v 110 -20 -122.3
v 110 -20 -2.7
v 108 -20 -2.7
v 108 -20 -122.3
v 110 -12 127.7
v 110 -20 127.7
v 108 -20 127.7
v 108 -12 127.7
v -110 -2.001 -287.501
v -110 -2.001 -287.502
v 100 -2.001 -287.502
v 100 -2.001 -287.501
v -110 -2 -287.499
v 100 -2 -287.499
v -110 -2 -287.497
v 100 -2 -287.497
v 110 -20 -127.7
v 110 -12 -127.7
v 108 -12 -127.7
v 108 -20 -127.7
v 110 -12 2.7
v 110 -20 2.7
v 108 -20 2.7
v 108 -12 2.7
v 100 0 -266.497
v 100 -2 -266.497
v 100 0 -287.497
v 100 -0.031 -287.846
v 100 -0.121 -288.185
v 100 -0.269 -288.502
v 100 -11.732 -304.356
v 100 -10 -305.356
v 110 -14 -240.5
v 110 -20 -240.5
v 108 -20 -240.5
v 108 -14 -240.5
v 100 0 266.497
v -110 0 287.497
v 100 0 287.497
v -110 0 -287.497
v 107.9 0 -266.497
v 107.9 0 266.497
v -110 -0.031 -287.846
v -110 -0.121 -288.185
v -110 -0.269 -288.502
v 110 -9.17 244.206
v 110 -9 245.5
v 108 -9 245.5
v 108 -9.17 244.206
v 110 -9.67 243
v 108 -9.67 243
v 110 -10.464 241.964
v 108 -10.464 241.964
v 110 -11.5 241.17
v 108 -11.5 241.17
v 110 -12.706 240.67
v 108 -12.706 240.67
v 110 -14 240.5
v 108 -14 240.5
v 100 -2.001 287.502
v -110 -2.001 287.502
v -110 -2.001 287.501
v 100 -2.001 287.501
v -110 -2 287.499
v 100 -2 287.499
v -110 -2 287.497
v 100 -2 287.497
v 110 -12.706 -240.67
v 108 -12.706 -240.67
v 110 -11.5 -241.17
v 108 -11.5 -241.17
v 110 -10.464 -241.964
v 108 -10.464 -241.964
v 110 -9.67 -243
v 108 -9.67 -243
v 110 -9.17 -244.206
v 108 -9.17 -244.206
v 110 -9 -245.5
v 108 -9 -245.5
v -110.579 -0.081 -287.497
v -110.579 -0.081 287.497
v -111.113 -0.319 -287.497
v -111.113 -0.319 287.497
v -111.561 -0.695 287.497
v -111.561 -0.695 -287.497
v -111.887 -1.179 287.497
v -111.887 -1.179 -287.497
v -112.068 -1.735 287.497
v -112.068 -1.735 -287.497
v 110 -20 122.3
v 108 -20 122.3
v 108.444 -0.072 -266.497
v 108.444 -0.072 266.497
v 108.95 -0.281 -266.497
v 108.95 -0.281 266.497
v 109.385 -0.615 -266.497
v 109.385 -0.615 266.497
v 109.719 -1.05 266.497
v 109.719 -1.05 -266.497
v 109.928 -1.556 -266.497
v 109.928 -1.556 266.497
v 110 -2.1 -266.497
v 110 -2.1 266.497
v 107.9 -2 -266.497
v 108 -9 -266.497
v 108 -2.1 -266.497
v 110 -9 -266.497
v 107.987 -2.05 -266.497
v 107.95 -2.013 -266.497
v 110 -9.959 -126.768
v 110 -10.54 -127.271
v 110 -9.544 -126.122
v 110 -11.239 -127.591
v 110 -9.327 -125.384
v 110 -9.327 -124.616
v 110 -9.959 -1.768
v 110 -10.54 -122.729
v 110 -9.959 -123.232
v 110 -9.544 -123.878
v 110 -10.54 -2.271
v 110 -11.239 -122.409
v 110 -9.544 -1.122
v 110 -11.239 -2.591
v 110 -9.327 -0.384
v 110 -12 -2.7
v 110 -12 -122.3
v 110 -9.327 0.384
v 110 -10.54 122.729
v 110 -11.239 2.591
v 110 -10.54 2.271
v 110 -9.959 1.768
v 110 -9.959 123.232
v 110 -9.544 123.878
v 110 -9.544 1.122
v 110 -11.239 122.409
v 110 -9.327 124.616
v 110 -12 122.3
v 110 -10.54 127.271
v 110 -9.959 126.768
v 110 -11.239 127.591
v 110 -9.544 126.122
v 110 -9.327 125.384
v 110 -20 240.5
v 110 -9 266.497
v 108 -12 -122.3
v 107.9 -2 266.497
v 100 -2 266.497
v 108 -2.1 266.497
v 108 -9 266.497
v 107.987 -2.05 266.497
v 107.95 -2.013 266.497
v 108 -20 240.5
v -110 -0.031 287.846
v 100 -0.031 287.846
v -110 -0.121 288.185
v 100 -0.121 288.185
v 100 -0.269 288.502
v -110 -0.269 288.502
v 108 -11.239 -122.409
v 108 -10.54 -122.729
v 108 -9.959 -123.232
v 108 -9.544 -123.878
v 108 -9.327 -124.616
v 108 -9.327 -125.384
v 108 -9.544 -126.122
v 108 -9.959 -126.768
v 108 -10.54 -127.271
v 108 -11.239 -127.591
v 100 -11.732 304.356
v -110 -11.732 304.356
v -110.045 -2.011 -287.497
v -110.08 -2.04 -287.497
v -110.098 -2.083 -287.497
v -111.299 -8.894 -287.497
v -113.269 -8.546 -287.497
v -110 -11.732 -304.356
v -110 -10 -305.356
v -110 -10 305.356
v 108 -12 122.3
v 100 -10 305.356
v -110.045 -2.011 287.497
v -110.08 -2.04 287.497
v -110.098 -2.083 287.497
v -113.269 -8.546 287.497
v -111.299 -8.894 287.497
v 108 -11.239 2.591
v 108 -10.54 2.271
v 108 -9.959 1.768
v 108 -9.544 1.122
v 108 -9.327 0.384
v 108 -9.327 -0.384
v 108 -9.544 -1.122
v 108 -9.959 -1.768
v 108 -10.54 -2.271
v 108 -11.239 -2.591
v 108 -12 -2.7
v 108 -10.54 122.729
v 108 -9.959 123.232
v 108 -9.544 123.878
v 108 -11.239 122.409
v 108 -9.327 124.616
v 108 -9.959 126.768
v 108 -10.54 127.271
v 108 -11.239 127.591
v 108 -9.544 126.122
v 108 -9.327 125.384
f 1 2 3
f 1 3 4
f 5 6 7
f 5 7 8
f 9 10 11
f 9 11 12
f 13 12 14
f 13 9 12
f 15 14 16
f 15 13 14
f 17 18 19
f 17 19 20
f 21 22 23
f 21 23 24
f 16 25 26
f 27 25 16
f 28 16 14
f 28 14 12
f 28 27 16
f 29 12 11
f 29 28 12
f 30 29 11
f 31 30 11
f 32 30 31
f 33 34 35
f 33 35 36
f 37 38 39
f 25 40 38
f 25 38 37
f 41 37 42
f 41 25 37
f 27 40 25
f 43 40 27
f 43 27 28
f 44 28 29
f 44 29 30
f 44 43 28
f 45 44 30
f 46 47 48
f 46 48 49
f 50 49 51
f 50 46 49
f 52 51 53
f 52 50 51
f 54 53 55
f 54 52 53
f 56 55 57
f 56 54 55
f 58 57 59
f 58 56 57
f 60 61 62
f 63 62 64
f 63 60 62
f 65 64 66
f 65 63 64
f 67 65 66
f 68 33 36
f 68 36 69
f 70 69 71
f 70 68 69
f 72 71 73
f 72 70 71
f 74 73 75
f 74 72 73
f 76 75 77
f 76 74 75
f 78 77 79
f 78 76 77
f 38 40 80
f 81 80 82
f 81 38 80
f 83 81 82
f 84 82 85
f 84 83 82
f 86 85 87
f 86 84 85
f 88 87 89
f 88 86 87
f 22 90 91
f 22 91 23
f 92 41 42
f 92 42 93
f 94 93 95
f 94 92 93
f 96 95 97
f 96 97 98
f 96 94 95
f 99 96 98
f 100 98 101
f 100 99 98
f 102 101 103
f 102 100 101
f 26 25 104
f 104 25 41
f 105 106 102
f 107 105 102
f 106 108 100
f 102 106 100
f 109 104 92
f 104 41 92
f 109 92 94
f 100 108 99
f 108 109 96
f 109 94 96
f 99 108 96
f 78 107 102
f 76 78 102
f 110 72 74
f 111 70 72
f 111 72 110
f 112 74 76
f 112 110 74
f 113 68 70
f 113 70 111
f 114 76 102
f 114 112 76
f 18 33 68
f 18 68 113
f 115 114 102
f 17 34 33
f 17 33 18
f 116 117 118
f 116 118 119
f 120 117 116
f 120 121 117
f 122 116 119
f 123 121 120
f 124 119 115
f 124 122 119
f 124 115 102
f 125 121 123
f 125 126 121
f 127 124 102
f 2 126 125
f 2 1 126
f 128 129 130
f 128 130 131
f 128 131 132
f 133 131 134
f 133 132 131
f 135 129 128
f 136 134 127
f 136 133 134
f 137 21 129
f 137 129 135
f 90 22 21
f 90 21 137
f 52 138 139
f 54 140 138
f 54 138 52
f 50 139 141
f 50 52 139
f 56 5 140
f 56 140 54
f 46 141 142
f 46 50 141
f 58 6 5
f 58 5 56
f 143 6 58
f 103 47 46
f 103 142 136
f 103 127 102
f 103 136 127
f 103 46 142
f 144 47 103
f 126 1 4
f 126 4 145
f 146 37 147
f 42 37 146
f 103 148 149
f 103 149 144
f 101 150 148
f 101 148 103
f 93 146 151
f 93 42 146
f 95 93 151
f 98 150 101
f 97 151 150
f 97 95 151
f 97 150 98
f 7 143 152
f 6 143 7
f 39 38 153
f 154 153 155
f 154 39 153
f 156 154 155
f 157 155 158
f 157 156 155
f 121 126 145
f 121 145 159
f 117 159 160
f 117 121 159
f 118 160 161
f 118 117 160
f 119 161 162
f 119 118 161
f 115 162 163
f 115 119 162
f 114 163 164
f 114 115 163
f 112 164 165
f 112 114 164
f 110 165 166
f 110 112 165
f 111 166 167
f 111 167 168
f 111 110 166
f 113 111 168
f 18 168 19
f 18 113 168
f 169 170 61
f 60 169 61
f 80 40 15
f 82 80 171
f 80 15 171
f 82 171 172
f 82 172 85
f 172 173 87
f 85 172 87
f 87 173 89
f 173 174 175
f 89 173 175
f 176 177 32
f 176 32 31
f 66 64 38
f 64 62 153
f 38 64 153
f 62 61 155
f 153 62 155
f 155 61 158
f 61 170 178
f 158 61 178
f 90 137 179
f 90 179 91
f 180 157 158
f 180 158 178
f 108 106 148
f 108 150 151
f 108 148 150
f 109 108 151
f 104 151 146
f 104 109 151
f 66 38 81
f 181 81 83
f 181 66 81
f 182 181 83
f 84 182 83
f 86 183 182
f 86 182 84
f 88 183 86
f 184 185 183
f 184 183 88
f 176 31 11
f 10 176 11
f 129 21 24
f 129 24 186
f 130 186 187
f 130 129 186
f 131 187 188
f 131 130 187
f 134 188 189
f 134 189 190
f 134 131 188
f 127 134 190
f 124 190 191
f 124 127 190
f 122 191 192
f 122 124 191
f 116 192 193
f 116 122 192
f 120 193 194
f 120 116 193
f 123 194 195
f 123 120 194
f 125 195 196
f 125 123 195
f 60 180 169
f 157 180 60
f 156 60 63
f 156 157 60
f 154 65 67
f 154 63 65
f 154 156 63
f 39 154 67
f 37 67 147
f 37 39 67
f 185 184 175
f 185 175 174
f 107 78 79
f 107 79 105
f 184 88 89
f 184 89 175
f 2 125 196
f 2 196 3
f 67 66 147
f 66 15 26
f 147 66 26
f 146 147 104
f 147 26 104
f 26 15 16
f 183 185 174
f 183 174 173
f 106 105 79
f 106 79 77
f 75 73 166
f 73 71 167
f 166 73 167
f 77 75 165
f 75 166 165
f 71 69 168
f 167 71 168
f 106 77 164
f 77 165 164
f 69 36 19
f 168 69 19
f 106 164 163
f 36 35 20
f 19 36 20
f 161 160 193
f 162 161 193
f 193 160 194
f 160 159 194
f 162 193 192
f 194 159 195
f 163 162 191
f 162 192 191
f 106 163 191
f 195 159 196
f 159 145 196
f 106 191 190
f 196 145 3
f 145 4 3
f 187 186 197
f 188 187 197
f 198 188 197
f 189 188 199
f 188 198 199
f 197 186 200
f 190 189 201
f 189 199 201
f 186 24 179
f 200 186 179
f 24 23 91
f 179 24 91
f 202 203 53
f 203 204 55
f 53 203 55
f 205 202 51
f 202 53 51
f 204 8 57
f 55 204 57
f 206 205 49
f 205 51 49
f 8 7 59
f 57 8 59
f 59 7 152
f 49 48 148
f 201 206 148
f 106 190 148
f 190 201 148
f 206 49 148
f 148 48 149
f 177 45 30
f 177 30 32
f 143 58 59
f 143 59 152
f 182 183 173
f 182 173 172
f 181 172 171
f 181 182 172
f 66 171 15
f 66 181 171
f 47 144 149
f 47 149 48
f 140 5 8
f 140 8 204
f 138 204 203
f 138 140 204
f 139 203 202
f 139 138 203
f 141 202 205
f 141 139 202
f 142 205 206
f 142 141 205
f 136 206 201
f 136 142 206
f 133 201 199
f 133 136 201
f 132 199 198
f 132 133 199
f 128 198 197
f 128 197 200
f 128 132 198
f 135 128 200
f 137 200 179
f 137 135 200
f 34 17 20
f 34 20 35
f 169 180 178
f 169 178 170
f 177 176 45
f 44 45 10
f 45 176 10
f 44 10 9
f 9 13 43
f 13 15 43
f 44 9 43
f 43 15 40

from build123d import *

# Parameters (mm, degrees)
SKIZZE9_W                       = 220
SKIZZE9_H                       = 575
BASIS_BLECH2_DEPTH              = 2
KANTE_LASCHE3_STRIP_W           = 8.2
KANTE_LASCHE3_STRIP_H           = 2
KANTE_LASCHE3_STRIP_CUT_DEPTH   = 575
KANTE_LASCHE3_DEPTH             = 575
KANTE_LASCHE3_FLAT_DEPTH        = 2
KANTE_LASCHE4_STRIP_CUT_DEPTH   = 217.9
KANTE_LASCHE4_STRIP_CUT_2_DEPTH = 217.9
KANTE_LASCHE4_DEPTH             = 217.9
KANTE_LASCHE4_BEND_DEPTH        = 217.9
SKIZZE43_W                      = 10
SKIZZE43_H                      = 42
SCHNITT_LINEAR_AUSTRAGEN4_DEPTH = 326.18077275
KANTE_LASCHE5_DEPTH             = 574.994641016


# Sheet-metal steps are written as plain solids
with BuildPart() as part:
    # Skizze9 → Basis-Blech2 (new body)
    with BuildSketch(Plane(origin=(0, 0, 0), x_dir=(1, 0, 0), z_dir=(0, 1, 0))):
        Rectangle(SKIZZE9_W, SKIZZE9_H)
    extrude(amount=-BASIS_BLECH2_DEPTH)

    # Kante-Lasche3 strip (across the edge) → Kante-Lasche3 strip cut (cut)
    with BuildSketch(Plane(origin=(110, -2, -287.5), x_dir=(-1, 0, 0), z_dir=(0, 0, 1))):
        with Locations((-2, -1)):
            Rectangle(KANTE_LASCHE3_STRIP_W, KANTE_LASCHE3_STRIP_H)
    extrude(amount=KANTE_LASCHE3_STRIP_CUT_DEPTH, mode=Mode.SUBTRACT)

    # Kante-Lasche3 bend section (across the edge) → Kante-Lasche3 (add)
    with BuildSketch(Plane(origin=(110, -2, -287.5), x_dir=(-1, 0, 0), z_dir=(0, 0, 1))):
        with BuildLine():
            Line((0, 0.1), (2, 0.1))
            ThreePointArc((2, 0.1), (2.029289322, 0.029289322), (2.1, 0))
            Line((2.1, 0), (2.1, -2))
            ThreePointArc((2.1, -2), (0.61507576, -1.38492424), (0, 0.1))
        make_face()
    extrude(amount=KANTE_LASCHE3_DEPTH)

    # Kante-Lasche3 profile (on flange) → Kante-Lasche3 flat (add)
    with BuildSketch(Plane(origin=(110, -2, 0), x_dir=(0, 0, 1), z_dir=(1, 0, 0))):
        with BuildLine():
            Line((287.5, 0.1), (287.5, 7))
            Line((287.5, 7), (245.5, 7))
            ThreePointArc((245.5, 7), (241.964466094, 8.464466094), (240.5, 12))
            Line((240.5, 12), (240.5, 18))
            Line((240.5, 18), (127.7, 18))
            Line((127.7, 18), (127.7, 10))
            ThreePointArc((127.7, 10), (125, 7.3), (122.3, 10))
            Line((122.3, 10), (122.3, 18))
            Line((122.3, 18), (2.7, 18))
            Line((2.7, 18), (2.7, 10))
            ThreePointArc((2.7, 10), (0, 7.3), (-2.7, 10))
            Line((-2.7, 10), (-2.7, 18))
            Line((-2.7, 18), (-122.3, 18))
            Line((-122.3, 18), (-122.3, 10))
            ThreePointArc((-122.3, 10), (-125, 7.3), (-127.7, 10))
            Line((-127.7, 10), (-127.7, 18))
            Line((-127.7, 18), (-240.5, 18))
            Line((-240.5, 18), (-240.5, 12))
            ThreePointArc((-240.5, 12), (-241.964466094, 8.464466094), (-245.5, 7))
            Line((-245.5, 7), (-287.5, 7))
            Line((-287.5, 7), (-287.5, 0.1))
            Line((-287.5, 0.1), (287.5, 0.1))
        make_face()
    extrude(amount=-KANTE_LASCHE3_FLAT_DEPTH)

    # Kante-Lasche4 strip (across the edge) → Kante-Lasche4 strip cut (cut)
    with BuildSketch(Plane(origin=(-110, -2, -287.5), x_dir=(0, -0.8660254037844416, 0.49999999999999495), z_dir=(1, 0, 0))):
        Polygon((-5.740711062, 5.94320323), (-1.730711062, -1.002320508), (0.001339746, -0.002320508), (-4.008660254, 6.94320323), align=None)
    extrude(amount=KANTE_LASCHE4_STRIP_CUT_DEPTH, mode=Mode.SUBTRACT)

    # Kante-Lasche4 strip 2 (across the edge) → Kante-Lasche4 strip cut 2 (cut)
    with BuildSketch(Plane(origin=(107.9, -2, 287.5), x_dir=(0, -0.8660254037844416, -0.49999999999999495), z_dir=(-1, 0, 0))):
        Polygon((-5.740711062, 5.94320323), (-1.730711062, -1.002320508), (0.001339746, -0.002320508), (-4.008660254, 6.94320323), align=None)
    extrude(amount=KANTE_LASCHE4_STRIP_CUT_2_DEPTH, mode=Mode.SUBTRACT)

    # Kante-Lasche4 section (across the edge) → Kante-Lasche4 (add)
    with BuildSketch(Plane(origin=(-110, -2, -287.5), x_dir=(0, -0.8660254037844416, 0.49999999999999495), z_dir=(1, 0, 0))):
        with BuildLine():
            Line((-2, 0.002679492), (-2, 19.464101615))
            Line((-2, 19.464101615), (0, 19.464101615))
            Line((0, 19.464101615), (0, 0.002679492))
            ThreePointArc((0, 0.002679492), (0.000340742, 9.1301e-05), (0.001339746, -0.002320508))
            Line((0.001339746, -0.002320508), (-1.730711062, -1.002320508))
            ThreePointArc((-1.730711062, -1.002320508), (-1.931510911, -0.517546789), (-2, 0.002679492))
        make_face()
    extrude(amount=KANTE_LASCHE4_DEPTH)

    # Kante-Lasche4 section 2 (across the edge) → Kante-Lasche4 bend (add)
    with BuildSketch(Plane(origin=(107.9, -2, 287.5), x_dir=(0, -0.8660254037844416, -0.49999999999999495), z_dir=(-1, 0, 0))):
        with BuildLine():
            Line((-2, 0.002679492), (-2, 19.464101615))
            Line((-2, 19.464101615), (0, 19.464101615))
            Line((0, 19.464101615), (0, 0.002679492))
            ThreePointArc((0, 0.002679492), (0.000340742, 9.1301e-05), (0.001339746, -0.002320508))
            Line((0.001339746, -0.002320508), (-1.730711062, -1.002320508))
            ThreePointArc((-1.730711062, -1.002320508), (-1.931510911, -0.517546789), (-2, 0.002679492))
        make_face()
    extrude(amount=KANTE_LASCHE4_BEND_DEPTH)

    # Skizze43 → Schnitt-Linear austragen4 (cut, through all)
    with BuildSketch(Plane(origin=(0, 0, 0), x_dir=(1, 0, 0), z_dir=(0, 1, 0))):
        with Locations((105, 287.497320508)):
            Rectangle(SKIZZE43_W, SKIZZE43_H)
        with Locations((105, -287.497320508)):
            Rectangle(SKIZZE43_W, SKIZZE43_H)
    extrude(amount=-SCHNITT_LINEAR_AUSTRAGEN4_DEPTH, mode=Mode.SUBTRACT)

    # Kante-Lasche5 section (across the edge) → Kante-Lasche5 (add)
    with BuildSketch(Plane(origin=(-110.083909963, -2, 287.497320508), x_dir=(0.9848077530122075, -0.17364817766693427, 0), z_dir=(0, 0, -1))):
        with BuildLine():
            Line((-2, 0.083909963), (-2, 7))
            Line((-2, 7), (0, 7))
            Line((0, 7), (0, 0.083909963))
            ThreePointArc((0, 0.083909963), (0.023395556, 0.019631202), (0.082635182, -0.014570812))
            Line((0.082635182, -0.014570812), (-0.264661173, -1.984186318))
            ThreePointArc((-0.264661173, -1.984186318), (-1.508693331, -1.265944017), (-2, 0.083909963))
        make_face()
    extrude(amount=KANTE_LASCHE5_DEPTH)


solid = part.part
